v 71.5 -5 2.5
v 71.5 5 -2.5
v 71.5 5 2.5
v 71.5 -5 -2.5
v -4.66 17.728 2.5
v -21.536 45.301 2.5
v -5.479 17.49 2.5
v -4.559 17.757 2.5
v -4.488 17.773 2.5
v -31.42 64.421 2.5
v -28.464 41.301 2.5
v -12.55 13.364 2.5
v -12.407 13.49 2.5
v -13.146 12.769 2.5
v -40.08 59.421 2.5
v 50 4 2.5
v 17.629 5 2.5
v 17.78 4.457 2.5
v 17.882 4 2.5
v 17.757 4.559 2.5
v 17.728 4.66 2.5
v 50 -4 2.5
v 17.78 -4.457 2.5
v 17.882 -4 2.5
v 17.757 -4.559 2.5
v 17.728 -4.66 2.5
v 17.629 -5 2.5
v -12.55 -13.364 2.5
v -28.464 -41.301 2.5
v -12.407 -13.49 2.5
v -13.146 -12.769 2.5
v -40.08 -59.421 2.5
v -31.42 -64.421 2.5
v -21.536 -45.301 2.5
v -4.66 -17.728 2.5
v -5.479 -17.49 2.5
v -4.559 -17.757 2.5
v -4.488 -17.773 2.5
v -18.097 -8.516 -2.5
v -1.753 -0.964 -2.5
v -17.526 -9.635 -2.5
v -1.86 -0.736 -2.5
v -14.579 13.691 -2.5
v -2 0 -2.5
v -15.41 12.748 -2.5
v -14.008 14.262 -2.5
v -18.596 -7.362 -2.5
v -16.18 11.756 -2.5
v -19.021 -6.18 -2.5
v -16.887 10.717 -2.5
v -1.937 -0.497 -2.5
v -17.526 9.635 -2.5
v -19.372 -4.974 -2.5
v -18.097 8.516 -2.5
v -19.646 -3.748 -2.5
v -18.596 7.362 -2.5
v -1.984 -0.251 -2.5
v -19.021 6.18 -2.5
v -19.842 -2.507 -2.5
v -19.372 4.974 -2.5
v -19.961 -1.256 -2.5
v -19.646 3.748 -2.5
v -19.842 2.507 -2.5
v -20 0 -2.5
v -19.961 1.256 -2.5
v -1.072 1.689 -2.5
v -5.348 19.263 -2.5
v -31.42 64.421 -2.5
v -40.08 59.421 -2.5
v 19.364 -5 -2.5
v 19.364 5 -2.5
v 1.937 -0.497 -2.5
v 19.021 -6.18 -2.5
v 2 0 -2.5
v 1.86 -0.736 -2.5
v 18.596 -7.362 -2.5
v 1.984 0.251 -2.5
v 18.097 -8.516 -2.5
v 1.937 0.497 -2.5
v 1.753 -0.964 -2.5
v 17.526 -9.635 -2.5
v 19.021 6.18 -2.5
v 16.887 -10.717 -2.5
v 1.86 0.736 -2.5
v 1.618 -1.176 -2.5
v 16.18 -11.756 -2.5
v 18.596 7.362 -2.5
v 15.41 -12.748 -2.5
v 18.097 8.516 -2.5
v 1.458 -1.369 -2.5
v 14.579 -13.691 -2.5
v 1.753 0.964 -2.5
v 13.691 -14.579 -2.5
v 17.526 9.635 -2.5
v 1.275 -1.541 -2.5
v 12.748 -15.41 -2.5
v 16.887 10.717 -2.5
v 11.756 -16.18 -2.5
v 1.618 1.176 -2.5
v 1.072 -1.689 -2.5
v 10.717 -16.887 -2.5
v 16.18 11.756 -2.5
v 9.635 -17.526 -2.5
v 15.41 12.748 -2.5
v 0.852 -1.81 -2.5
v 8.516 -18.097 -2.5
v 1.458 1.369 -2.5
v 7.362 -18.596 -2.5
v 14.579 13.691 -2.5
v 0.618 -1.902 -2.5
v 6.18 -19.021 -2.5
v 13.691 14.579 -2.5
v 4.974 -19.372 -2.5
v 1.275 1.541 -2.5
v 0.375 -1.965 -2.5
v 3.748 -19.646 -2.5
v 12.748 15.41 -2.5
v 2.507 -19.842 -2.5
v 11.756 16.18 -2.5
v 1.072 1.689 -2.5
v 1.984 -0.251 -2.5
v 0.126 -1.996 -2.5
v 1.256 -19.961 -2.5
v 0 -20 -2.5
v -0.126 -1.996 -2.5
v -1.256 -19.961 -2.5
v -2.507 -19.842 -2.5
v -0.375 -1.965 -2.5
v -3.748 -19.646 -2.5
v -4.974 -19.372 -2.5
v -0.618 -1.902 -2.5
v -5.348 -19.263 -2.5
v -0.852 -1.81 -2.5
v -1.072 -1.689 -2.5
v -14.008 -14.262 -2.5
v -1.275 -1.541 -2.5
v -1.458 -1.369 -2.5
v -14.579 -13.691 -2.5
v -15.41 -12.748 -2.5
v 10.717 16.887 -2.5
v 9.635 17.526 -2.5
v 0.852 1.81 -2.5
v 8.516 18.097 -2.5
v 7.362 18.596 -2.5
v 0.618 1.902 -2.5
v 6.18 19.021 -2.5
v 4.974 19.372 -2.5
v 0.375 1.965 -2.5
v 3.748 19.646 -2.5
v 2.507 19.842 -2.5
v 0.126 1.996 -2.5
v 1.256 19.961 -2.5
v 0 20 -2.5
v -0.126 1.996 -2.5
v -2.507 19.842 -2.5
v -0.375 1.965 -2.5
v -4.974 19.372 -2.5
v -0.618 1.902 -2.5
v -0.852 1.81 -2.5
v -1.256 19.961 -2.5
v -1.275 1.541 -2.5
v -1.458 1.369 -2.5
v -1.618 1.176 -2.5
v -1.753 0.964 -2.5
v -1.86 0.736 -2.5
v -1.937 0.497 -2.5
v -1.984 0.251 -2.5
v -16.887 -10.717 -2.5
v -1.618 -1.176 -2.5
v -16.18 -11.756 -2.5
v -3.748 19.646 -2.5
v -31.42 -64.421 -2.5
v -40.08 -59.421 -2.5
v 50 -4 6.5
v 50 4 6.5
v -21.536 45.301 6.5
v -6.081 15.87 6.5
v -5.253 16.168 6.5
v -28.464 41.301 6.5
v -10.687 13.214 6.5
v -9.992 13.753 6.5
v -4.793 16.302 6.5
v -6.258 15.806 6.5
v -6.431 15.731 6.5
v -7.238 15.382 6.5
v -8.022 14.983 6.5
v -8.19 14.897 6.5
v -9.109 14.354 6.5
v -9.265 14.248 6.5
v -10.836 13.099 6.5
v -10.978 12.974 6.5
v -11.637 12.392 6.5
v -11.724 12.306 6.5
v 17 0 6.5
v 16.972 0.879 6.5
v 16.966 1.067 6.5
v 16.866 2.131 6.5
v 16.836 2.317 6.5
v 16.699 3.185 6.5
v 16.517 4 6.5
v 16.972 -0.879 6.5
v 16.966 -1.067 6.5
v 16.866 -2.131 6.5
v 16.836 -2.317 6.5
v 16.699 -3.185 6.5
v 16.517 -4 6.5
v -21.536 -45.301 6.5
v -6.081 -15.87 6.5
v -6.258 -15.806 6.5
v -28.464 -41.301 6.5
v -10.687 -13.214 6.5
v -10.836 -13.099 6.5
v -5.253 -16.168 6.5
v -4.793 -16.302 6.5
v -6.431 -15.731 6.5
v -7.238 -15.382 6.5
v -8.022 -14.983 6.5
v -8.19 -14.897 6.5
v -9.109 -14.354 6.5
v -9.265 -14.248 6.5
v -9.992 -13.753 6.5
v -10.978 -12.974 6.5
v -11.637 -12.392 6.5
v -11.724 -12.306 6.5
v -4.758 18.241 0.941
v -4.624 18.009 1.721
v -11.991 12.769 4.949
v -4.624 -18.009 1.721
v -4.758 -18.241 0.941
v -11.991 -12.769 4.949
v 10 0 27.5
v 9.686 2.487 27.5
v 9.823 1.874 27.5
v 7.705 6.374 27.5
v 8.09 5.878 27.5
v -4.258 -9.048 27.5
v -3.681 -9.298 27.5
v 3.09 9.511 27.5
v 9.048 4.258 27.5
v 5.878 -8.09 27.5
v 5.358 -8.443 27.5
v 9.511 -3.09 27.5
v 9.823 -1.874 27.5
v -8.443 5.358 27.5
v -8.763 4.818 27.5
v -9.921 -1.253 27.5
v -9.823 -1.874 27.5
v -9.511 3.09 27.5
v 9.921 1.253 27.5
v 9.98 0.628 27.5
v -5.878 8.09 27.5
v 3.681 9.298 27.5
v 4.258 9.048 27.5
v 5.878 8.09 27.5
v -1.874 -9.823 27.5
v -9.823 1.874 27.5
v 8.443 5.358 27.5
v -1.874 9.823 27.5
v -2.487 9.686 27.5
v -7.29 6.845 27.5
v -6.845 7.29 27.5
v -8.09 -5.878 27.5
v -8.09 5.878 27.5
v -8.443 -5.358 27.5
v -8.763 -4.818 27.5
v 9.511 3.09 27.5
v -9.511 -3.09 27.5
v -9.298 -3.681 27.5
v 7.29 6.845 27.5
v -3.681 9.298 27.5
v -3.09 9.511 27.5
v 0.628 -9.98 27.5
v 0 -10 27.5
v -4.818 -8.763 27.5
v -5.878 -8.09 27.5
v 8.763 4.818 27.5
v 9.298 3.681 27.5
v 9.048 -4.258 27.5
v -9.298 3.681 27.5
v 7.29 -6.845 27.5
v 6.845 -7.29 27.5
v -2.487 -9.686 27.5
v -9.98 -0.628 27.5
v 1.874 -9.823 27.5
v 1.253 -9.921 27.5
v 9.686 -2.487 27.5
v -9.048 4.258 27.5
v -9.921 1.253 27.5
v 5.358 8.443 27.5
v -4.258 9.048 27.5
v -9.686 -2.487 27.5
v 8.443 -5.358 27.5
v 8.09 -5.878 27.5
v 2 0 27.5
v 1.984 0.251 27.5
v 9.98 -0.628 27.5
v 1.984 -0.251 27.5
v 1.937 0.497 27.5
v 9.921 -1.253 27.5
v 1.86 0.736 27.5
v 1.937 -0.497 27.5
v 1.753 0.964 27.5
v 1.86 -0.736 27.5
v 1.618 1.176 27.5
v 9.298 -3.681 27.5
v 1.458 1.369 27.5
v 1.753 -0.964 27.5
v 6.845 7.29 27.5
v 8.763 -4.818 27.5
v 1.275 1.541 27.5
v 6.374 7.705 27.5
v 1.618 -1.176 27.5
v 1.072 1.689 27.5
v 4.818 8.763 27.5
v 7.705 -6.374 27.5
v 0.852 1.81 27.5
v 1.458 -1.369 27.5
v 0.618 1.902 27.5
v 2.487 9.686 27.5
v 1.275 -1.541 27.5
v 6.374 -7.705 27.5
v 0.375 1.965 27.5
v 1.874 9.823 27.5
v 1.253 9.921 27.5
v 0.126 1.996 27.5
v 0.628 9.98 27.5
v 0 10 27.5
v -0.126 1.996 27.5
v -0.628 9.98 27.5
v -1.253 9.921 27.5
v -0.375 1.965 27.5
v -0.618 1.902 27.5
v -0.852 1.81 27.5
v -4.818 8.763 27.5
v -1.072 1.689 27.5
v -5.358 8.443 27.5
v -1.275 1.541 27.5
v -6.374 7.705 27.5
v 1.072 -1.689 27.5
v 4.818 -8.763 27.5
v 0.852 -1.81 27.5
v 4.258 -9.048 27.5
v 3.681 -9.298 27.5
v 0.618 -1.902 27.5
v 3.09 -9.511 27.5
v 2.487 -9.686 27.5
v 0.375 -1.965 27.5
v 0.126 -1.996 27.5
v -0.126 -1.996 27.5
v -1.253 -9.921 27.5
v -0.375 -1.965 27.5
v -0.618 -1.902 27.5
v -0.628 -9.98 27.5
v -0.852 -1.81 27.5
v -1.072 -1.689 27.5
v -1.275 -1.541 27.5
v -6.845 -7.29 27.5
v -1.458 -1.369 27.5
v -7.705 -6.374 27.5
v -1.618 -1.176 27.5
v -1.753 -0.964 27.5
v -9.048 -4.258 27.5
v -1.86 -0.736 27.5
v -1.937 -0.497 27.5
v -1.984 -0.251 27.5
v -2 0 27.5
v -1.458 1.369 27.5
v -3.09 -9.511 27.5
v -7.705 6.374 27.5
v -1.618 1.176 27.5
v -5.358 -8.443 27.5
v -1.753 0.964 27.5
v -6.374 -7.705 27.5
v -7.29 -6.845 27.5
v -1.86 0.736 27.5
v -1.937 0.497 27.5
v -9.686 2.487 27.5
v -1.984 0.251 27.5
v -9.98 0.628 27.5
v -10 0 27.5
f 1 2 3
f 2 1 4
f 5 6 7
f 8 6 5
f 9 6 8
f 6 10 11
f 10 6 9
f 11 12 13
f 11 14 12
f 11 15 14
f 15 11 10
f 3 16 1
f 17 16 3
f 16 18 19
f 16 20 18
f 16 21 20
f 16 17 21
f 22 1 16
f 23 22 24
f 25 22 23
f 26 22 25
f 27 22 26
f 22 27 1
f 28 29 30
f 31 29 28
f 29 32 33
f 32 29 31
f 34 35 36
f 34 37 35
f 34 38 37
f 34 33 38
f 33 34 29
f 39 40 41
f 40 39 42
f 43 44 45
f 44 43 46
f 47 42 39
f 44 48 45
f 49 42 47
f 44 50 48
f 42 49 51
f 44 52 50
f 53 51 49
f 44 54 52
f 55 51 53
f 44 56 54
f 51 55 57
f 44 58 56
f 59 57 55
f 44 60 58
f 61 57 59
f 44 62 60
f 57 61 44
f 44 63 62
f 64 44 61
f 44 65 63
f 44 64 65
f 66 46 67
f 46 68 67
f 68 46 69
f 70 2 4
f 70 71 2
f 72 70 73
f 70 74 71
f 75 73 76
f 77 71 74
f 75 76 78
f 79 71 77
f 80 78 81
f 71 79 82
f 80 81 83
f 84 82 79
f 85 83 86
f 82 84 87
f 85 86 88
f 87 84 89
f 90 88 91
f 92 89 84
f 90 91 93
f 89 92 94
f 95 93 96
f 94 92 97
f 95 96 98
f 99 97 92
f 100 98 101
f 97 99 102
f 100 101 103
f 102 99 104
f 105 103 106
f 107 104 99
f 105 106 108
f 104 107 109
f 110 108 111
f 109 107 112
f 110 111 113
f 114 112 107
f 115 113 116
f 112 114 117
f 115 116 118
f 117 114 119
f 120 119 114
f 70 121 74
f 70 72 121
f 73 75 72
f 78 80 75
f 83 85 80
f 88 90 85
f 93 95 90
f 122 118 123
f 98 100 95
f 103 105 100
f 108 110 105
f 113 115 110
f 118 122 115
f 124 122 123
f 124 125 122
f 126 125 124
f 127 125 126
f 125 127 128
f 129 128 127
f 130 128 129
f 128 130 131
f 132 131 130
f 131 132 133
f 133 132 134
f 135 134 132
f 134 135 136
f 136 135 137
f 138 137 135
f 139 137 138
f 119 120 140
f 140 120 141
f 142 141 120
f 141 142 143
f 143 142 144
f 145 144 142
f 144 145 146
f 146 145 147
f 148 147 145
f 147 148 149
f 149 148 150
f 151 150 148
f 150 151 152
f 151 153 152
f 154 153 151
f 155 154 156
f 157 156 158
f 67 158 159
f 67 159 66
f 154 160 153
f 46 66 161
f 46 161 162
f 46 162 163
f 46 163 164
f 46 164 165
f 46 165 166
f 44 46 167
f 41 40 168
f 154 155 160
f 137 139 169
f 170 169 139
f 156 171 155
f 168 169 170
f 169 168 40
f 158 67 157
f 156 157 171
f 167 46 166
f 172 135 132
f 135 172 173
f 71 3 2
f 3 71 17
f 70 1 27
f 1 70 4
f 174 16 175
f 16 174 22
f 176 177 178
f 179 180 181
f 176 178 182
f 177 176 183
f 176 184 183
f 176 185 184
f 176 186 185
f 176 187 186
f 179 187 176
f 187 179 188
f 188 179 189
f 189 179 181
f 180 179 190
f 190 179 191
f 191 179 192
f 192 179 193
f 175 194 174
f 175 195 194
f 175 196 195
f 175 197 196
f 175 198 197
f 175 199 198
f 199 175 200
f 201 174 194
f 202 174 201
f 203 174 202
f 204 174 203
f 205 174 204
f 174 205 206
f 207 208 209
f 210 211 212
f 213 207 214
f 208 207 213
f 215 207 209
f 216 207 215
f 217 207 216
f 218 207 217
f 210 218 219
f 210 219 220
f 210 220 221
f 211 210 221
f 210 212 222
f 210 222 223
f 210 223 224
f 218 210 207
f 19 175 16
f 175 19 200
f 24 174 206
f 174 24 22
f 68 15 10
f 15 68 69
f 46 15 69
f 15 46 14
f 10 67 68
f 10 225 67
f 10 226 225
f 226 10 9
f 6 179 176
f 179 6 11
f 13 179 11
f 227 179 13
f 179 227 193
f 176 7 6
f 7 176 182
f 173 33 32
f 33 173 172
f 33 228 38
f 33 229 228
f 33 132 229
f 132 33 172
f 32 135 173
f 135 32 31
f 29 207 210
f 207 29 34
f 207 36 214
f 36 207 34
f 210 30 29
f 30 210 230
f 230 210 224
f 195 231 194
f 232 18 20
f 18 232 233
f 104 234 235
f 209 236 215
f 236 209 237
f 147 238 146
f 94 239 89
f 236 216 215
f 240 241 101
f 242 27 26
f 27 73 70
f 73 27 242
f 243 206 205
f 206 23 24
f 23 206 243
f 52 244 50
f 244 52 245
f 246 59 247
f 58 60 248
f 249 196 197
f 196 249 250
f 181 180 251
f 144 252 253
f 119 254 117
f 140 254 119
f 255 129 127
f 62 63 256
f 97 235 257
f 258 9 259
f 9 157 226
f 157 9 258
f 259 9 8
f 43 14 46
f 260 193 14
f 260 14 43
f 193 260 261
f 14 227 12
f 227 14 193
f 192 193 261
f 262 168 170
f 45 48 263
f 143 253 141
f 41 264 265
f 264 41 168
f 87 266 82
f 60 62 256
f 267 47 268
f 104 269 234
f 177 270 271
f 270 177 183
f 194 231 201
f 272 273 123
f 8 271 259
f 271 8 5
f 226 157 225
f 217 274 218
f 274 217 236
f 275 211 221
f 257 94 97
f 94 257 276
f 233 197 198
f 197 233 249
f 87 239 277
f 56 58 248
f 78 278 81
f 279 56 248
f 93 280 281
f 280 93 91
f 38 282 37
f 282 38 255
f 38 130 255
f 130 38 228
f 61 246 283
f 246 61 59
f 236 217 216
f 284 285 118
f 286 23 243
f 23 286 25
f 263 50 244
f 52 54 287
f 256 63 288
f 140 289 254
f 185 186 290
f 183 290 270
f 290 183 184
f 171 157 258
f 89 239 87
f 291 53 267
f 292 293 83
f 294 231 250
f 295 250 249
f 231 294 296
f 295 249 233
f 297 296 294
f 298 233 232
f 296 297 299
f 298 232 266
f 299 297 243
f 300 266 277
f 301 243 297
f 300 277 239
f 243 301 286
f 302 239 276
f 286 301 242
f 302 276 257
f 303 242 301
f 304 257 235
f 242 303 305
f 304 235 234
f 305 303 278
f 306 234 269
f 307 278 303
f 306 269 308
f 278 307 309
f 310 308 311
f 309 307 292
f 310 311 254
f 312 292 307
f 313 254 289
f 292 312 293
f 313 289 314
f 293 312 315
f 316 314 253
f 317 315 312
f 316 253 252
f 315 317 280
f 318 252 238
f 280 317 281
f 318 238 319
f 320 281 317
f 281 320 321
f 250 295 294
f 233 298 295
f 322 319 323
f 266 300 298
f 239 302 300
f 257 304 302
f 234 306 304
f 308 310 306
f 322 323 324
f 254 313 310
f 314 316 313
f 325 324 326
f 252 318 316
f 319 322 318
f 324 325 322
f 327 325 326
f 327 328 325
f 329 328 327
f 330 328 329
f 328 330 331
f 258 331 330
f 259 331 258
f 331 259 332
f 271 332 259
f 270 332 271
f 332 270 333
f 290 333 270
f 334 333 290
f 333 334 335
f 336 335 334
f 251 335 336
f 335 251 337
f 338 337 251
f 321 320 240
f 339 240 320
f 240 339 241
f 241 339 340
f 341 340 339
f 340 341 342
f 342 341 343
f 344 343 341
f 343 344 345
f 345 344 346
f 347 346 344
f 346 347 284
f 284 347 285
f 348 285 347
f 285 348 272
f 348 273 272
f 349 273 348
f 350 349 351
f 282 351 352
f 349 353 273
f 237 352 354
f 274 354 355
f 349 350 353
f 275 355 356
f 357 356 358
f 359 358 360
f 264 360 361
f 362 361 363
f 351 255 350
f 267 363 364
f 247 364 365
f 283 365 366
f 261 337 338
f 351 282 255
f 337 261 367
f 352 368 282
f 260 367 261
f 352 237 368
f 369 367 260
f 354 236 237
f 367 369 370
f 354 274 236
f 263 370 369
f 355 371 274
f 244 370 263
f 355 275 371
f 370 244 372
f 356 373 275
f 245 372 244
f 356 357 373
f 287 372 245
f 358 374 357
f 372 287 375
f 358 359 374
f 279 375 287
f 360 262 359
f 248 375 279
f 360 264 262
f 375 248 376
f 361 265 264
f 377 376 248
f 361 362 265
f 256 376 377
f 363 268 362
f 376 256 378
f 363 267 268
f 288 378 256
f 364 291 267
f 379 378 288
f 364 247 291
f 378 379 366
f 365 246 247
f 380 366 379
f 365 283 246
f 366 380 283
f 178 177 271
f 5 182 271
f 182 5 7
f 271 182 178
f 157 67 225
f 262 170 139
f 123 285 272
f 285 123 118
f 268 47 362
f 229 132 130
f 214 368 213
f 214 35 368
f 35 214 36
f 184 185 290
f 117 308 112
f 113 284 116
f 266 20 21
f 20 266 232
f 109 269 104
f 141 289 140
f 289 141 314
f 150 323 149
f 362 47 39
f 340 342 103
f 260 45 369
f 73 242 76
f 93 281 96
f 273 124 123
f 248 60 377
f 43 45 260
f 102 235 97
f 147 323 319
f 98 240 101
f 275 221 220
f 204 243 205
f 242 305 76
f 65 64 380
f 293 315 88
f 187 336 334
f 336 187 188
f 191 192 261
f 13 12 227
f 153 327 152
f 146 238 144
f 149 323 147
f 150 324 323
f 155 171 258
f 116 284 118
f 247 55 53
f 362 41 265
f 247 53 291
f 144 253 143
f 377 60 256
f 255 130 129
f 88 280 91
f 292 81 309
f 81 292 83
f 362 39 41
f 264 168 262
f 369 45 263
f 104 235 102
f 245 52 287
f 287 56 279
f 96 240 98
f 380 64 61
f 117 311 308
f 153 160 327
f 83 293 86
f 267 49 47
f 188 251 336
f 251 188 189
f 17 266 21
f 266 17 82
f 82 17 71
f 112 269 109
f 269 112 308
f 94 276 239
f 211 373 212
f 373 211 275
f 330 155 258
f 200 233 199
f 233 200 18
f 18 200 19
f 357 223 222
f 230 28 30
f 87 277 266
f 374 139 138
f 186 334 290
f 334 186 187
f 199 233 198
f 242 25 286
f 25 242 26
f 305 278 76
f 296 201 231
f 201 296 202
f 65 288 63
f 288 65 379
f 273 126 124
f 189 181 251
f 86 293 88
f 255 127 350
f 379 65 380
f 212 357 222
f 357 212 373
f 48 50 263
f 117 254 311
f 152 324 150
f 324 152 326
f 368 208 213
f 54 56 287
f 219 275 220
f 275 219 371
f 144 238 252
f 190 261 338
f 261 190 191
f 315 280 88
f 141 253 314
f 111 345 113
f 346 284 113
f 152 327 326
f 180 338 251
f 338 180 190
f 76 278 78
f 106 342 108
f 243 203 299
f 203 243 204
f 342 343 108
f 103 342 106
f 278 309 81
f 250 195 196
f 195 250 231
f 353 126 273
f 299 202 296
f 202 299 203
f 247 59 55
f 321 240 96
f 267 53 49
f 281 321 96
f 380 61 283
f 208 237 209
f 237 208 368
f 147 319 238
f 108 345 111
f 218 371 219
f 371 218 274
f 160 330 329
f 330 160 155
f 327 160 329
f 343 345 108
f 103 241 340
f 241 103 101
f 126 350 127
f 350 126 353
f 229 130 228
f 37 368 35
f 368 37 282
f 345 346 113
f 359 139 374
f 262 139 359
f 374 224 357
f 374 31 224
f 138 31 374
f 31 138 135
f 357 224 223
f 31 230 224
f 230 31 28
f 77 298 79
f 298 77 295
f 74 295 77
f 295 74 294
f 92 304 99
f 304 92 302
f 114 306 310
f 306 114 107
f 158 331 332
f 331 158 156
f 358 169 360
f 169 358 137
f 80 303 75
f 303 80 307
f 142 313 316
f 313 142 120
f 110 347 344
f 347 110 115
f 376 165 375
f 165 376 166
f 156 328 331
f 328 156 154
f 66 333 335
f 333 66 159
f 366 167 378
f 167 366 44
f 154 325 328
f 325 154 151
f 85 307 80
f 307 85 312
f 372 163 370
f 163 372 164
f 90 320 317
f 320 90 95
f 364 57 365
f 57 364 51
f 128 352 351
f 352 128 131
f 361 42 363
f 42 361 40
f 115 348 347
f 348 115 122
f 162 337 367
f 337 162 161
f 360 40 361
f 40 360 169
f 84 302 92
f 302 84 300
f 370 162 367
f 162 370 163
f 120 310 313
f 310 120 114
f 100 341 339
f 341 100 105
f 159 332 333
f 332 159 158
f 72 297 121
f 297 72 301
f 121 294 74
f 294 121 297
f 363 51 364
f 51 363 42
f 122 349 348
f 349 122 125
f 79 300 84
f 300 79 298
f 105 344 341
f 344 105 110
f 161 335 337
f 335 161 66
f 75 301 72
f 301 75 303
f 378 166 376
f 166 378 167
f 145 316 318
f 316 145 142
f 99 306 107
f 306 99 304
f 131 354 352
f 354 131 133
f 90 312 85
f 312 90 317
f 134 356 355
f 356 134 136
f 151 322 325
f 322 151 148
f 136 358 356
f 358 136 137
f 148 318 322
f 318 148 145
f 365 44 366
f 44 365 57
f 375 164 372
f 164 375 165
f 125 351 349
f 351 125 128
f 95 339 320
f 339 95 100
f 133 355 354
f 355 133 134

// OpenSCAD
hole_diameter = 4;
module_scale  = 1;


module leg() {
	translate([34,0,0]) {
		scale([75,10,5]) {
			cube([1,1,1], center=true);
		}
	}
	translate([25,0,0]) {
		translate([0,0,4]) {
			scale([50,8,5]) {
				cube([1,1,1], center=true);
			}
		}
	}
}

module item() {
	difference() {
		scale([ module_scale, module_scale, module_scale ]) {
			union() {
				leg();
				rotate(120) {
					leg();
				}
				rotate(240) {
					leg();
				}
				translate([0,0,10]) {
					translate([0,0,2.5]) {
						cylinder(r1=20,r2=10,h=30, center=true, $fn=100);
					}
				}
			}
		}
		cylinder(r=hole_diameter/2,h=1000, center=true, $fn=50);
	}
}

item();
